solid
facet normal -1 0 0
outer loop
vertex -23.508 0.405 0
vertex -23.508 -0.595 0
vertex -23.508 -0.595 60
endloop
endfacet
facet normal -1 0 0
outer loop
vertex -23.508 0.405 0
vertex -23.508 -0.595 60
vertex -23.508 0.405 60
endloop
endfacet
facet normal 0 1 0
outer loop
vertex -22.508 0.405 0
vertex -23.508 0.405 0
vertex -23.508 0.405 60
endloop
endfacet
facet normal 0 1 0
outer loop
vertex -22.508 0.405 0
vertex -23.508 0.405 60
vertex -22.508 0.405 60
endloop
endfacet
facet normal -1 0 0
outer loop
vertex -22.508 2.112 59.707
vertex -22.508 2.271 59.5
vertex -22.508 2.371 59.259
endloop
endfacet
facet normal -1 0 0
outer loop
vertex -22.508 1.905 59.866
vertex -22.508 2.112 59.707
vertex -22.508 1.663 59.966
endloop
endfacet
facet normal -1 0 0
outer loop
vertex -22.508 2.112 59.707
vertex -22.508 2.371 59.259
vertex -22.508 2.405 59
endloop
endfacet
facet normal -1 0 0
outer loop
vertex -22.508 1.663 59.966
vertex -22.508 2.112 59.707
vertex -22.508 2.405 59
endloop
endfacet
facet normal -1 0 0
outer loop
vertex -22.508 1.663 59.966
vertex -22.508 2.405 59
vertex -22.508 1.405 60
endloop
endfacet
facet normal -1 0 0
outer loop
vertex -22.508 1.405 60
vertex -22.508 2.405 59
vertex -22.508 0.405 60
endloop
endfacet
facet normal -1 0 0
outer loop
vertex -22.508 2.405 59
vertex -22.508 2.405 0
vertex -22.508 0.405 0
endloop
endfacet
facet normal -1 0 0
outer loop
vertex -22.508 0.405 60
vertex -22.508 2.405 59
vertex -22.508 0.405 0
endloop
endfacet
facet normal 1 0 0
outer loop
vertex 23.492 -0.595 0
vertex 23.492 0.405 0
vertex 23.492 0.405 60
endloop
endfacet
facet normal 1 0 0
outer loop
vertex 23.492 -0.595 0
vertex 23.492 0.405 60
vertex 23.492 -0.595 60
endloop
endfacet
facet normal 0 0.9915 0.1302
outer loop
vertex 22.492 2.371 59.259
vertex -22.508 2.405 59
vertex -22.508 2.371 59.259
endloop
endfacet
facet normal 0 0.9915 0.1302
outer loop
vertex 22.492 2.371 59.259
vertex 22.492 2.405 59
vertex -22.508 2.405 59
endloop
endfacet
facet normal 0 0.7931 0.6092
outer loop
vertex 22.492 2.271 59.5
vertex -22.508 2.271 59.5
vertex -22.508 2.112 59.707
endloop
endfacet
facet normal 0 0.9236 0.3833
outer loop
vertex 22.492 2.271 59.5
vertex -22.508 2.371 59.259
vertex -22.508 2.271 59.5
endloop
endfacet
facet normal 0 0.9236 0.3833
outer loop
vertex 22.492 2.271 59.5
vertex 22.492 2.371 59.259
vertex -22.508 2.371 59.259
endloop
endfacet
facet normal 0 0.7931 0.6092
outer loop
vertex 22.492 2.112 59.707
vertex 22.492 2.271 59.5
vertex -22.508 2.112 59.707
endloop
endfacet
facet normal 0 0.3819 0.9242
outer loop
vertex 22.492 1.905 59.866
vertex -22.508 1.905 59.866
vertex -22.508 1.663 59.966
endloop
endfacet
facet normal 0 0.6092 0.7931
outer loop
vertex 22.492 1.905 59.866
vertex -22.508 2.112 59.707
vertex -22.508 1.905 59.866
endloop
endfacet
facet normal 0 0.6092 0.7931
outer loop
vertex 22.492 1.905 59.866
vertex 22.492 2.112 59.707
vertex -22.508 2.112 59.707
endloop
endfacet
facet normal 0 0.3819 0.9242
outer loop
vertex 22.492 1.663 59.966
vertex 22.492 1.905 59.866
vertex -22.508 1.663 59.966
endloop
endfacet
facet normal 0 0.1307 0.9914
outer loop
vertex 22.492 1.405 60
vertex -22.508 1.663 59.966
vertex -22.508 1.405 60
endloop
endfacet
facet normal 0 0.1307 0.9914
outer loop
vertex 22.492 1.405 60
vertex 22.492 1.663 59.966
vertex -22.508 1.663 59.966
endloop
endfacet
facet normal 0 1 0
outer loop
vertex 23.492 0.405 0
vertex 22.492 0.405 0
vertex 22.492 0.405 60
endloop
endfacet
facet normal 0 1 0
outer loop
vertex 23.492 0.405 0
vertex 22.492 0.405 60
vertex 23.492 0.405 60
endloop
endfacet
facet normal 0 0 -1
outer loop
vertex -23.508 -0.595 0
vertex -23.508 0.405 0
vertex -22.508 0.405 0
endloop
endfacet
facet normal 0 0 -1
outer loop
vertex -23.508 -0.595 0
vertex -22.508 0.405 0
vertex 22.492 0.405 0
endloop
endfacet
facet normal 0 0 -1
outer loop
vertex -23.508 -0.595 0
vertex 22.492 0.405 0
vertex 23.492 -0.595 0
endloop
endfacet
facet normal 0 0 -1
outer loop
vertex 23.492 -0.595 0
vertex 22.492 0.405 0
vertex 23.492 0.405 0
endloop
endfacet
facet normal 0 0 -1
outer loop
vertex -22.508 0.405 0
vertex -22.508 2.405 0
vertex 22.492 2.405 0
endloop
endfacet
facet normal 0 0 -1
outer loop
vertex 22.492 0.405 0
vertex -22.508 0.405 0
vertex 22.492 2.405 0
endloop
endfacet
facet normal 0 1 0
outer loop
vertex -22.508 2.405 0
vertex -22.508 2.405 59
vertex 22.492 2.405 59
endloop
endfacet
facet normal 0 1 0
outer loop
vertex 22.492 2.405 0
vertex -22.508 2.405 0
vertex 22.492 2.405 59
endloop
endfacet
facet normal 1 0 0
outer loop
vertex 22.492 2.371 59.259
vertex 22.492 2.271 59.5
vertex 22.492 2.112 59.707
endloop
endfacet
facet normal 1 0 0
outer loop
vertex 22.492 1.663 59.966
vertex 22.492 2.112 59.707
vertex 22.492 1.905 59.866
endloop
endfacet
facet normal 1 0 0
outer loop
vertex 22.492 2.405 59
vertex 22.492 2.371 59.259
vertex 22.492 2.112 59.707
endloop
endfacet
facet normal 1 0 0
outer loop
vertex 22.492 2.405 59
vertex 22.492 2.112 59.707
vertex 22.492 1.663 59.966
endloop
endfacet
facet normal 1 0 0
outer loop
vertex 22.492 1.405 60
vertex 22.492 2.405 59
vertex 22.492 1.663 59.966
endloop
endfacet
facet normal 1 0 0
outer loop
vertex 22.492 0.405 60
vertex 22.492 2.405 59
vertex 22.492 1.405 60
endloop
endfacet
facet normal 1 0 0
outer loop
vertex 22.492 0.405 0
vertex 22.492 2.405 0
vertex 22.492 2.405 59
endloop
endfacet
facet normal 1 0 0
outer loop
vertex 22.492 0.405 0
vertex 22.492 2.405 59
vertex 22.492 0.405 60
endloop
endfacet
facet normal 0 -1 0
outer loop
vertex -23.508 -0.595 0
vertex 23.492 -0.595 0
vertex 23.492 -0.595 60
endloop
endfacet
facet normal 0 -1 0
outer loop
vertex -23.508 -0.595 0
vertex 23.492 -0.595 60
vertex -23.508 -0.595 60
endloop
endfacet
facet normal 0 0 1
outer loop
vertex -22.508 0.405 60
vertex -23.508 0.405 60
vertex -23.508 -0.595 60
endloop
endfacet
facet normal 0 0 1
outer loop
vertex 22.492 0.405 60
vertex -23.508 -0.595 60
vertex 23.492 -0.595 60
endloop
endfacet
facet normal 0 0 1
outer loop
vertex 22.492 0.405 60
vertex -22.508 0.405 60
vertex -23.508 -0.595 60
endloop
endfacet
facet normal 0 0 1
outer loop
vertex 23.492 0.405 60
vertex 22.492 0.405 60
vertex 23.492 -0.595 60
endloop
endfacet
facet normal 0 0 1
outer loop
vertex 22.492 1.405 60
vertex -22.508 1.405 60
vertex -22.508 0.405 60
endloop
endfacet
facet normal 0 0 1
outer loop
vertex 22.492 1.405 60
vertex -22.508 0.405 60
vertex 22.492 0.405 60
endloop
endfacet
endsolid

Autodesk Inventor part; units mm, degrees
ref_plane "YZ Plane" through (0, 0, 0) normal (1, 0, 0) x (0, 1, 0)
ref_plane "XZ Plane" through (0, 0, 0) normal (0, 1, 0) x (-1, 0, 0)
ref_plane "XY Plane" through (0, 0, 0) normal (0, 0, 1) x (1, 0, 0)
sketch "Sketch1" plane through (0, 0, 0) normal (0, 0, 1) x (1, 0, 0)
  line L0 (-22.5075, -0.5954) -> (22.4925, -0.5954)
  line L1 (22.4925, -0.5954) -> (22.4925, 0.4046)
  line L2 (-22.5075, -0.5954) -> (-23.5075, -0.5954)
  line L3 (-23.5075, -0.5954) -> (-23.5075, 0.4046)
  line L4 (-22.5075, 2.4046) -> (22.4925, 2.4046)
  line L5 (22.4925, 2.4046) -> (22.4925, 0.4046)
  line L6 (22.4925, 0.4046) -> (23.4925, 0.4046)
  line L7 (23.4925, 0.4046) -> (23.4925, -0.5954)
  line L8 (23.4925, -0.5954) -> (22.4925, -0.5954)
  line L9 (-23.5075, 0.4046) -> (-22.5075, 0.4046)
  line L10 (-22.5075, 2.4046) -> (-22.5075, 0.4046)
  point P0 (0, 0)
  dimension "d2" = 1
  dimension "d3" = 1
  dimension "d5" = 1
  dimension "d6" = 1
  dimension "d7" = 3
  dimension "d11" = 2
extrude "Extrusion1" add sketch "Sketch1" along normal blind 60
fillet "Fillet1" radius 1 1 edges at (-0.0075, 2.4046, 60)
properties part number "upper coverr_3DPrint"
